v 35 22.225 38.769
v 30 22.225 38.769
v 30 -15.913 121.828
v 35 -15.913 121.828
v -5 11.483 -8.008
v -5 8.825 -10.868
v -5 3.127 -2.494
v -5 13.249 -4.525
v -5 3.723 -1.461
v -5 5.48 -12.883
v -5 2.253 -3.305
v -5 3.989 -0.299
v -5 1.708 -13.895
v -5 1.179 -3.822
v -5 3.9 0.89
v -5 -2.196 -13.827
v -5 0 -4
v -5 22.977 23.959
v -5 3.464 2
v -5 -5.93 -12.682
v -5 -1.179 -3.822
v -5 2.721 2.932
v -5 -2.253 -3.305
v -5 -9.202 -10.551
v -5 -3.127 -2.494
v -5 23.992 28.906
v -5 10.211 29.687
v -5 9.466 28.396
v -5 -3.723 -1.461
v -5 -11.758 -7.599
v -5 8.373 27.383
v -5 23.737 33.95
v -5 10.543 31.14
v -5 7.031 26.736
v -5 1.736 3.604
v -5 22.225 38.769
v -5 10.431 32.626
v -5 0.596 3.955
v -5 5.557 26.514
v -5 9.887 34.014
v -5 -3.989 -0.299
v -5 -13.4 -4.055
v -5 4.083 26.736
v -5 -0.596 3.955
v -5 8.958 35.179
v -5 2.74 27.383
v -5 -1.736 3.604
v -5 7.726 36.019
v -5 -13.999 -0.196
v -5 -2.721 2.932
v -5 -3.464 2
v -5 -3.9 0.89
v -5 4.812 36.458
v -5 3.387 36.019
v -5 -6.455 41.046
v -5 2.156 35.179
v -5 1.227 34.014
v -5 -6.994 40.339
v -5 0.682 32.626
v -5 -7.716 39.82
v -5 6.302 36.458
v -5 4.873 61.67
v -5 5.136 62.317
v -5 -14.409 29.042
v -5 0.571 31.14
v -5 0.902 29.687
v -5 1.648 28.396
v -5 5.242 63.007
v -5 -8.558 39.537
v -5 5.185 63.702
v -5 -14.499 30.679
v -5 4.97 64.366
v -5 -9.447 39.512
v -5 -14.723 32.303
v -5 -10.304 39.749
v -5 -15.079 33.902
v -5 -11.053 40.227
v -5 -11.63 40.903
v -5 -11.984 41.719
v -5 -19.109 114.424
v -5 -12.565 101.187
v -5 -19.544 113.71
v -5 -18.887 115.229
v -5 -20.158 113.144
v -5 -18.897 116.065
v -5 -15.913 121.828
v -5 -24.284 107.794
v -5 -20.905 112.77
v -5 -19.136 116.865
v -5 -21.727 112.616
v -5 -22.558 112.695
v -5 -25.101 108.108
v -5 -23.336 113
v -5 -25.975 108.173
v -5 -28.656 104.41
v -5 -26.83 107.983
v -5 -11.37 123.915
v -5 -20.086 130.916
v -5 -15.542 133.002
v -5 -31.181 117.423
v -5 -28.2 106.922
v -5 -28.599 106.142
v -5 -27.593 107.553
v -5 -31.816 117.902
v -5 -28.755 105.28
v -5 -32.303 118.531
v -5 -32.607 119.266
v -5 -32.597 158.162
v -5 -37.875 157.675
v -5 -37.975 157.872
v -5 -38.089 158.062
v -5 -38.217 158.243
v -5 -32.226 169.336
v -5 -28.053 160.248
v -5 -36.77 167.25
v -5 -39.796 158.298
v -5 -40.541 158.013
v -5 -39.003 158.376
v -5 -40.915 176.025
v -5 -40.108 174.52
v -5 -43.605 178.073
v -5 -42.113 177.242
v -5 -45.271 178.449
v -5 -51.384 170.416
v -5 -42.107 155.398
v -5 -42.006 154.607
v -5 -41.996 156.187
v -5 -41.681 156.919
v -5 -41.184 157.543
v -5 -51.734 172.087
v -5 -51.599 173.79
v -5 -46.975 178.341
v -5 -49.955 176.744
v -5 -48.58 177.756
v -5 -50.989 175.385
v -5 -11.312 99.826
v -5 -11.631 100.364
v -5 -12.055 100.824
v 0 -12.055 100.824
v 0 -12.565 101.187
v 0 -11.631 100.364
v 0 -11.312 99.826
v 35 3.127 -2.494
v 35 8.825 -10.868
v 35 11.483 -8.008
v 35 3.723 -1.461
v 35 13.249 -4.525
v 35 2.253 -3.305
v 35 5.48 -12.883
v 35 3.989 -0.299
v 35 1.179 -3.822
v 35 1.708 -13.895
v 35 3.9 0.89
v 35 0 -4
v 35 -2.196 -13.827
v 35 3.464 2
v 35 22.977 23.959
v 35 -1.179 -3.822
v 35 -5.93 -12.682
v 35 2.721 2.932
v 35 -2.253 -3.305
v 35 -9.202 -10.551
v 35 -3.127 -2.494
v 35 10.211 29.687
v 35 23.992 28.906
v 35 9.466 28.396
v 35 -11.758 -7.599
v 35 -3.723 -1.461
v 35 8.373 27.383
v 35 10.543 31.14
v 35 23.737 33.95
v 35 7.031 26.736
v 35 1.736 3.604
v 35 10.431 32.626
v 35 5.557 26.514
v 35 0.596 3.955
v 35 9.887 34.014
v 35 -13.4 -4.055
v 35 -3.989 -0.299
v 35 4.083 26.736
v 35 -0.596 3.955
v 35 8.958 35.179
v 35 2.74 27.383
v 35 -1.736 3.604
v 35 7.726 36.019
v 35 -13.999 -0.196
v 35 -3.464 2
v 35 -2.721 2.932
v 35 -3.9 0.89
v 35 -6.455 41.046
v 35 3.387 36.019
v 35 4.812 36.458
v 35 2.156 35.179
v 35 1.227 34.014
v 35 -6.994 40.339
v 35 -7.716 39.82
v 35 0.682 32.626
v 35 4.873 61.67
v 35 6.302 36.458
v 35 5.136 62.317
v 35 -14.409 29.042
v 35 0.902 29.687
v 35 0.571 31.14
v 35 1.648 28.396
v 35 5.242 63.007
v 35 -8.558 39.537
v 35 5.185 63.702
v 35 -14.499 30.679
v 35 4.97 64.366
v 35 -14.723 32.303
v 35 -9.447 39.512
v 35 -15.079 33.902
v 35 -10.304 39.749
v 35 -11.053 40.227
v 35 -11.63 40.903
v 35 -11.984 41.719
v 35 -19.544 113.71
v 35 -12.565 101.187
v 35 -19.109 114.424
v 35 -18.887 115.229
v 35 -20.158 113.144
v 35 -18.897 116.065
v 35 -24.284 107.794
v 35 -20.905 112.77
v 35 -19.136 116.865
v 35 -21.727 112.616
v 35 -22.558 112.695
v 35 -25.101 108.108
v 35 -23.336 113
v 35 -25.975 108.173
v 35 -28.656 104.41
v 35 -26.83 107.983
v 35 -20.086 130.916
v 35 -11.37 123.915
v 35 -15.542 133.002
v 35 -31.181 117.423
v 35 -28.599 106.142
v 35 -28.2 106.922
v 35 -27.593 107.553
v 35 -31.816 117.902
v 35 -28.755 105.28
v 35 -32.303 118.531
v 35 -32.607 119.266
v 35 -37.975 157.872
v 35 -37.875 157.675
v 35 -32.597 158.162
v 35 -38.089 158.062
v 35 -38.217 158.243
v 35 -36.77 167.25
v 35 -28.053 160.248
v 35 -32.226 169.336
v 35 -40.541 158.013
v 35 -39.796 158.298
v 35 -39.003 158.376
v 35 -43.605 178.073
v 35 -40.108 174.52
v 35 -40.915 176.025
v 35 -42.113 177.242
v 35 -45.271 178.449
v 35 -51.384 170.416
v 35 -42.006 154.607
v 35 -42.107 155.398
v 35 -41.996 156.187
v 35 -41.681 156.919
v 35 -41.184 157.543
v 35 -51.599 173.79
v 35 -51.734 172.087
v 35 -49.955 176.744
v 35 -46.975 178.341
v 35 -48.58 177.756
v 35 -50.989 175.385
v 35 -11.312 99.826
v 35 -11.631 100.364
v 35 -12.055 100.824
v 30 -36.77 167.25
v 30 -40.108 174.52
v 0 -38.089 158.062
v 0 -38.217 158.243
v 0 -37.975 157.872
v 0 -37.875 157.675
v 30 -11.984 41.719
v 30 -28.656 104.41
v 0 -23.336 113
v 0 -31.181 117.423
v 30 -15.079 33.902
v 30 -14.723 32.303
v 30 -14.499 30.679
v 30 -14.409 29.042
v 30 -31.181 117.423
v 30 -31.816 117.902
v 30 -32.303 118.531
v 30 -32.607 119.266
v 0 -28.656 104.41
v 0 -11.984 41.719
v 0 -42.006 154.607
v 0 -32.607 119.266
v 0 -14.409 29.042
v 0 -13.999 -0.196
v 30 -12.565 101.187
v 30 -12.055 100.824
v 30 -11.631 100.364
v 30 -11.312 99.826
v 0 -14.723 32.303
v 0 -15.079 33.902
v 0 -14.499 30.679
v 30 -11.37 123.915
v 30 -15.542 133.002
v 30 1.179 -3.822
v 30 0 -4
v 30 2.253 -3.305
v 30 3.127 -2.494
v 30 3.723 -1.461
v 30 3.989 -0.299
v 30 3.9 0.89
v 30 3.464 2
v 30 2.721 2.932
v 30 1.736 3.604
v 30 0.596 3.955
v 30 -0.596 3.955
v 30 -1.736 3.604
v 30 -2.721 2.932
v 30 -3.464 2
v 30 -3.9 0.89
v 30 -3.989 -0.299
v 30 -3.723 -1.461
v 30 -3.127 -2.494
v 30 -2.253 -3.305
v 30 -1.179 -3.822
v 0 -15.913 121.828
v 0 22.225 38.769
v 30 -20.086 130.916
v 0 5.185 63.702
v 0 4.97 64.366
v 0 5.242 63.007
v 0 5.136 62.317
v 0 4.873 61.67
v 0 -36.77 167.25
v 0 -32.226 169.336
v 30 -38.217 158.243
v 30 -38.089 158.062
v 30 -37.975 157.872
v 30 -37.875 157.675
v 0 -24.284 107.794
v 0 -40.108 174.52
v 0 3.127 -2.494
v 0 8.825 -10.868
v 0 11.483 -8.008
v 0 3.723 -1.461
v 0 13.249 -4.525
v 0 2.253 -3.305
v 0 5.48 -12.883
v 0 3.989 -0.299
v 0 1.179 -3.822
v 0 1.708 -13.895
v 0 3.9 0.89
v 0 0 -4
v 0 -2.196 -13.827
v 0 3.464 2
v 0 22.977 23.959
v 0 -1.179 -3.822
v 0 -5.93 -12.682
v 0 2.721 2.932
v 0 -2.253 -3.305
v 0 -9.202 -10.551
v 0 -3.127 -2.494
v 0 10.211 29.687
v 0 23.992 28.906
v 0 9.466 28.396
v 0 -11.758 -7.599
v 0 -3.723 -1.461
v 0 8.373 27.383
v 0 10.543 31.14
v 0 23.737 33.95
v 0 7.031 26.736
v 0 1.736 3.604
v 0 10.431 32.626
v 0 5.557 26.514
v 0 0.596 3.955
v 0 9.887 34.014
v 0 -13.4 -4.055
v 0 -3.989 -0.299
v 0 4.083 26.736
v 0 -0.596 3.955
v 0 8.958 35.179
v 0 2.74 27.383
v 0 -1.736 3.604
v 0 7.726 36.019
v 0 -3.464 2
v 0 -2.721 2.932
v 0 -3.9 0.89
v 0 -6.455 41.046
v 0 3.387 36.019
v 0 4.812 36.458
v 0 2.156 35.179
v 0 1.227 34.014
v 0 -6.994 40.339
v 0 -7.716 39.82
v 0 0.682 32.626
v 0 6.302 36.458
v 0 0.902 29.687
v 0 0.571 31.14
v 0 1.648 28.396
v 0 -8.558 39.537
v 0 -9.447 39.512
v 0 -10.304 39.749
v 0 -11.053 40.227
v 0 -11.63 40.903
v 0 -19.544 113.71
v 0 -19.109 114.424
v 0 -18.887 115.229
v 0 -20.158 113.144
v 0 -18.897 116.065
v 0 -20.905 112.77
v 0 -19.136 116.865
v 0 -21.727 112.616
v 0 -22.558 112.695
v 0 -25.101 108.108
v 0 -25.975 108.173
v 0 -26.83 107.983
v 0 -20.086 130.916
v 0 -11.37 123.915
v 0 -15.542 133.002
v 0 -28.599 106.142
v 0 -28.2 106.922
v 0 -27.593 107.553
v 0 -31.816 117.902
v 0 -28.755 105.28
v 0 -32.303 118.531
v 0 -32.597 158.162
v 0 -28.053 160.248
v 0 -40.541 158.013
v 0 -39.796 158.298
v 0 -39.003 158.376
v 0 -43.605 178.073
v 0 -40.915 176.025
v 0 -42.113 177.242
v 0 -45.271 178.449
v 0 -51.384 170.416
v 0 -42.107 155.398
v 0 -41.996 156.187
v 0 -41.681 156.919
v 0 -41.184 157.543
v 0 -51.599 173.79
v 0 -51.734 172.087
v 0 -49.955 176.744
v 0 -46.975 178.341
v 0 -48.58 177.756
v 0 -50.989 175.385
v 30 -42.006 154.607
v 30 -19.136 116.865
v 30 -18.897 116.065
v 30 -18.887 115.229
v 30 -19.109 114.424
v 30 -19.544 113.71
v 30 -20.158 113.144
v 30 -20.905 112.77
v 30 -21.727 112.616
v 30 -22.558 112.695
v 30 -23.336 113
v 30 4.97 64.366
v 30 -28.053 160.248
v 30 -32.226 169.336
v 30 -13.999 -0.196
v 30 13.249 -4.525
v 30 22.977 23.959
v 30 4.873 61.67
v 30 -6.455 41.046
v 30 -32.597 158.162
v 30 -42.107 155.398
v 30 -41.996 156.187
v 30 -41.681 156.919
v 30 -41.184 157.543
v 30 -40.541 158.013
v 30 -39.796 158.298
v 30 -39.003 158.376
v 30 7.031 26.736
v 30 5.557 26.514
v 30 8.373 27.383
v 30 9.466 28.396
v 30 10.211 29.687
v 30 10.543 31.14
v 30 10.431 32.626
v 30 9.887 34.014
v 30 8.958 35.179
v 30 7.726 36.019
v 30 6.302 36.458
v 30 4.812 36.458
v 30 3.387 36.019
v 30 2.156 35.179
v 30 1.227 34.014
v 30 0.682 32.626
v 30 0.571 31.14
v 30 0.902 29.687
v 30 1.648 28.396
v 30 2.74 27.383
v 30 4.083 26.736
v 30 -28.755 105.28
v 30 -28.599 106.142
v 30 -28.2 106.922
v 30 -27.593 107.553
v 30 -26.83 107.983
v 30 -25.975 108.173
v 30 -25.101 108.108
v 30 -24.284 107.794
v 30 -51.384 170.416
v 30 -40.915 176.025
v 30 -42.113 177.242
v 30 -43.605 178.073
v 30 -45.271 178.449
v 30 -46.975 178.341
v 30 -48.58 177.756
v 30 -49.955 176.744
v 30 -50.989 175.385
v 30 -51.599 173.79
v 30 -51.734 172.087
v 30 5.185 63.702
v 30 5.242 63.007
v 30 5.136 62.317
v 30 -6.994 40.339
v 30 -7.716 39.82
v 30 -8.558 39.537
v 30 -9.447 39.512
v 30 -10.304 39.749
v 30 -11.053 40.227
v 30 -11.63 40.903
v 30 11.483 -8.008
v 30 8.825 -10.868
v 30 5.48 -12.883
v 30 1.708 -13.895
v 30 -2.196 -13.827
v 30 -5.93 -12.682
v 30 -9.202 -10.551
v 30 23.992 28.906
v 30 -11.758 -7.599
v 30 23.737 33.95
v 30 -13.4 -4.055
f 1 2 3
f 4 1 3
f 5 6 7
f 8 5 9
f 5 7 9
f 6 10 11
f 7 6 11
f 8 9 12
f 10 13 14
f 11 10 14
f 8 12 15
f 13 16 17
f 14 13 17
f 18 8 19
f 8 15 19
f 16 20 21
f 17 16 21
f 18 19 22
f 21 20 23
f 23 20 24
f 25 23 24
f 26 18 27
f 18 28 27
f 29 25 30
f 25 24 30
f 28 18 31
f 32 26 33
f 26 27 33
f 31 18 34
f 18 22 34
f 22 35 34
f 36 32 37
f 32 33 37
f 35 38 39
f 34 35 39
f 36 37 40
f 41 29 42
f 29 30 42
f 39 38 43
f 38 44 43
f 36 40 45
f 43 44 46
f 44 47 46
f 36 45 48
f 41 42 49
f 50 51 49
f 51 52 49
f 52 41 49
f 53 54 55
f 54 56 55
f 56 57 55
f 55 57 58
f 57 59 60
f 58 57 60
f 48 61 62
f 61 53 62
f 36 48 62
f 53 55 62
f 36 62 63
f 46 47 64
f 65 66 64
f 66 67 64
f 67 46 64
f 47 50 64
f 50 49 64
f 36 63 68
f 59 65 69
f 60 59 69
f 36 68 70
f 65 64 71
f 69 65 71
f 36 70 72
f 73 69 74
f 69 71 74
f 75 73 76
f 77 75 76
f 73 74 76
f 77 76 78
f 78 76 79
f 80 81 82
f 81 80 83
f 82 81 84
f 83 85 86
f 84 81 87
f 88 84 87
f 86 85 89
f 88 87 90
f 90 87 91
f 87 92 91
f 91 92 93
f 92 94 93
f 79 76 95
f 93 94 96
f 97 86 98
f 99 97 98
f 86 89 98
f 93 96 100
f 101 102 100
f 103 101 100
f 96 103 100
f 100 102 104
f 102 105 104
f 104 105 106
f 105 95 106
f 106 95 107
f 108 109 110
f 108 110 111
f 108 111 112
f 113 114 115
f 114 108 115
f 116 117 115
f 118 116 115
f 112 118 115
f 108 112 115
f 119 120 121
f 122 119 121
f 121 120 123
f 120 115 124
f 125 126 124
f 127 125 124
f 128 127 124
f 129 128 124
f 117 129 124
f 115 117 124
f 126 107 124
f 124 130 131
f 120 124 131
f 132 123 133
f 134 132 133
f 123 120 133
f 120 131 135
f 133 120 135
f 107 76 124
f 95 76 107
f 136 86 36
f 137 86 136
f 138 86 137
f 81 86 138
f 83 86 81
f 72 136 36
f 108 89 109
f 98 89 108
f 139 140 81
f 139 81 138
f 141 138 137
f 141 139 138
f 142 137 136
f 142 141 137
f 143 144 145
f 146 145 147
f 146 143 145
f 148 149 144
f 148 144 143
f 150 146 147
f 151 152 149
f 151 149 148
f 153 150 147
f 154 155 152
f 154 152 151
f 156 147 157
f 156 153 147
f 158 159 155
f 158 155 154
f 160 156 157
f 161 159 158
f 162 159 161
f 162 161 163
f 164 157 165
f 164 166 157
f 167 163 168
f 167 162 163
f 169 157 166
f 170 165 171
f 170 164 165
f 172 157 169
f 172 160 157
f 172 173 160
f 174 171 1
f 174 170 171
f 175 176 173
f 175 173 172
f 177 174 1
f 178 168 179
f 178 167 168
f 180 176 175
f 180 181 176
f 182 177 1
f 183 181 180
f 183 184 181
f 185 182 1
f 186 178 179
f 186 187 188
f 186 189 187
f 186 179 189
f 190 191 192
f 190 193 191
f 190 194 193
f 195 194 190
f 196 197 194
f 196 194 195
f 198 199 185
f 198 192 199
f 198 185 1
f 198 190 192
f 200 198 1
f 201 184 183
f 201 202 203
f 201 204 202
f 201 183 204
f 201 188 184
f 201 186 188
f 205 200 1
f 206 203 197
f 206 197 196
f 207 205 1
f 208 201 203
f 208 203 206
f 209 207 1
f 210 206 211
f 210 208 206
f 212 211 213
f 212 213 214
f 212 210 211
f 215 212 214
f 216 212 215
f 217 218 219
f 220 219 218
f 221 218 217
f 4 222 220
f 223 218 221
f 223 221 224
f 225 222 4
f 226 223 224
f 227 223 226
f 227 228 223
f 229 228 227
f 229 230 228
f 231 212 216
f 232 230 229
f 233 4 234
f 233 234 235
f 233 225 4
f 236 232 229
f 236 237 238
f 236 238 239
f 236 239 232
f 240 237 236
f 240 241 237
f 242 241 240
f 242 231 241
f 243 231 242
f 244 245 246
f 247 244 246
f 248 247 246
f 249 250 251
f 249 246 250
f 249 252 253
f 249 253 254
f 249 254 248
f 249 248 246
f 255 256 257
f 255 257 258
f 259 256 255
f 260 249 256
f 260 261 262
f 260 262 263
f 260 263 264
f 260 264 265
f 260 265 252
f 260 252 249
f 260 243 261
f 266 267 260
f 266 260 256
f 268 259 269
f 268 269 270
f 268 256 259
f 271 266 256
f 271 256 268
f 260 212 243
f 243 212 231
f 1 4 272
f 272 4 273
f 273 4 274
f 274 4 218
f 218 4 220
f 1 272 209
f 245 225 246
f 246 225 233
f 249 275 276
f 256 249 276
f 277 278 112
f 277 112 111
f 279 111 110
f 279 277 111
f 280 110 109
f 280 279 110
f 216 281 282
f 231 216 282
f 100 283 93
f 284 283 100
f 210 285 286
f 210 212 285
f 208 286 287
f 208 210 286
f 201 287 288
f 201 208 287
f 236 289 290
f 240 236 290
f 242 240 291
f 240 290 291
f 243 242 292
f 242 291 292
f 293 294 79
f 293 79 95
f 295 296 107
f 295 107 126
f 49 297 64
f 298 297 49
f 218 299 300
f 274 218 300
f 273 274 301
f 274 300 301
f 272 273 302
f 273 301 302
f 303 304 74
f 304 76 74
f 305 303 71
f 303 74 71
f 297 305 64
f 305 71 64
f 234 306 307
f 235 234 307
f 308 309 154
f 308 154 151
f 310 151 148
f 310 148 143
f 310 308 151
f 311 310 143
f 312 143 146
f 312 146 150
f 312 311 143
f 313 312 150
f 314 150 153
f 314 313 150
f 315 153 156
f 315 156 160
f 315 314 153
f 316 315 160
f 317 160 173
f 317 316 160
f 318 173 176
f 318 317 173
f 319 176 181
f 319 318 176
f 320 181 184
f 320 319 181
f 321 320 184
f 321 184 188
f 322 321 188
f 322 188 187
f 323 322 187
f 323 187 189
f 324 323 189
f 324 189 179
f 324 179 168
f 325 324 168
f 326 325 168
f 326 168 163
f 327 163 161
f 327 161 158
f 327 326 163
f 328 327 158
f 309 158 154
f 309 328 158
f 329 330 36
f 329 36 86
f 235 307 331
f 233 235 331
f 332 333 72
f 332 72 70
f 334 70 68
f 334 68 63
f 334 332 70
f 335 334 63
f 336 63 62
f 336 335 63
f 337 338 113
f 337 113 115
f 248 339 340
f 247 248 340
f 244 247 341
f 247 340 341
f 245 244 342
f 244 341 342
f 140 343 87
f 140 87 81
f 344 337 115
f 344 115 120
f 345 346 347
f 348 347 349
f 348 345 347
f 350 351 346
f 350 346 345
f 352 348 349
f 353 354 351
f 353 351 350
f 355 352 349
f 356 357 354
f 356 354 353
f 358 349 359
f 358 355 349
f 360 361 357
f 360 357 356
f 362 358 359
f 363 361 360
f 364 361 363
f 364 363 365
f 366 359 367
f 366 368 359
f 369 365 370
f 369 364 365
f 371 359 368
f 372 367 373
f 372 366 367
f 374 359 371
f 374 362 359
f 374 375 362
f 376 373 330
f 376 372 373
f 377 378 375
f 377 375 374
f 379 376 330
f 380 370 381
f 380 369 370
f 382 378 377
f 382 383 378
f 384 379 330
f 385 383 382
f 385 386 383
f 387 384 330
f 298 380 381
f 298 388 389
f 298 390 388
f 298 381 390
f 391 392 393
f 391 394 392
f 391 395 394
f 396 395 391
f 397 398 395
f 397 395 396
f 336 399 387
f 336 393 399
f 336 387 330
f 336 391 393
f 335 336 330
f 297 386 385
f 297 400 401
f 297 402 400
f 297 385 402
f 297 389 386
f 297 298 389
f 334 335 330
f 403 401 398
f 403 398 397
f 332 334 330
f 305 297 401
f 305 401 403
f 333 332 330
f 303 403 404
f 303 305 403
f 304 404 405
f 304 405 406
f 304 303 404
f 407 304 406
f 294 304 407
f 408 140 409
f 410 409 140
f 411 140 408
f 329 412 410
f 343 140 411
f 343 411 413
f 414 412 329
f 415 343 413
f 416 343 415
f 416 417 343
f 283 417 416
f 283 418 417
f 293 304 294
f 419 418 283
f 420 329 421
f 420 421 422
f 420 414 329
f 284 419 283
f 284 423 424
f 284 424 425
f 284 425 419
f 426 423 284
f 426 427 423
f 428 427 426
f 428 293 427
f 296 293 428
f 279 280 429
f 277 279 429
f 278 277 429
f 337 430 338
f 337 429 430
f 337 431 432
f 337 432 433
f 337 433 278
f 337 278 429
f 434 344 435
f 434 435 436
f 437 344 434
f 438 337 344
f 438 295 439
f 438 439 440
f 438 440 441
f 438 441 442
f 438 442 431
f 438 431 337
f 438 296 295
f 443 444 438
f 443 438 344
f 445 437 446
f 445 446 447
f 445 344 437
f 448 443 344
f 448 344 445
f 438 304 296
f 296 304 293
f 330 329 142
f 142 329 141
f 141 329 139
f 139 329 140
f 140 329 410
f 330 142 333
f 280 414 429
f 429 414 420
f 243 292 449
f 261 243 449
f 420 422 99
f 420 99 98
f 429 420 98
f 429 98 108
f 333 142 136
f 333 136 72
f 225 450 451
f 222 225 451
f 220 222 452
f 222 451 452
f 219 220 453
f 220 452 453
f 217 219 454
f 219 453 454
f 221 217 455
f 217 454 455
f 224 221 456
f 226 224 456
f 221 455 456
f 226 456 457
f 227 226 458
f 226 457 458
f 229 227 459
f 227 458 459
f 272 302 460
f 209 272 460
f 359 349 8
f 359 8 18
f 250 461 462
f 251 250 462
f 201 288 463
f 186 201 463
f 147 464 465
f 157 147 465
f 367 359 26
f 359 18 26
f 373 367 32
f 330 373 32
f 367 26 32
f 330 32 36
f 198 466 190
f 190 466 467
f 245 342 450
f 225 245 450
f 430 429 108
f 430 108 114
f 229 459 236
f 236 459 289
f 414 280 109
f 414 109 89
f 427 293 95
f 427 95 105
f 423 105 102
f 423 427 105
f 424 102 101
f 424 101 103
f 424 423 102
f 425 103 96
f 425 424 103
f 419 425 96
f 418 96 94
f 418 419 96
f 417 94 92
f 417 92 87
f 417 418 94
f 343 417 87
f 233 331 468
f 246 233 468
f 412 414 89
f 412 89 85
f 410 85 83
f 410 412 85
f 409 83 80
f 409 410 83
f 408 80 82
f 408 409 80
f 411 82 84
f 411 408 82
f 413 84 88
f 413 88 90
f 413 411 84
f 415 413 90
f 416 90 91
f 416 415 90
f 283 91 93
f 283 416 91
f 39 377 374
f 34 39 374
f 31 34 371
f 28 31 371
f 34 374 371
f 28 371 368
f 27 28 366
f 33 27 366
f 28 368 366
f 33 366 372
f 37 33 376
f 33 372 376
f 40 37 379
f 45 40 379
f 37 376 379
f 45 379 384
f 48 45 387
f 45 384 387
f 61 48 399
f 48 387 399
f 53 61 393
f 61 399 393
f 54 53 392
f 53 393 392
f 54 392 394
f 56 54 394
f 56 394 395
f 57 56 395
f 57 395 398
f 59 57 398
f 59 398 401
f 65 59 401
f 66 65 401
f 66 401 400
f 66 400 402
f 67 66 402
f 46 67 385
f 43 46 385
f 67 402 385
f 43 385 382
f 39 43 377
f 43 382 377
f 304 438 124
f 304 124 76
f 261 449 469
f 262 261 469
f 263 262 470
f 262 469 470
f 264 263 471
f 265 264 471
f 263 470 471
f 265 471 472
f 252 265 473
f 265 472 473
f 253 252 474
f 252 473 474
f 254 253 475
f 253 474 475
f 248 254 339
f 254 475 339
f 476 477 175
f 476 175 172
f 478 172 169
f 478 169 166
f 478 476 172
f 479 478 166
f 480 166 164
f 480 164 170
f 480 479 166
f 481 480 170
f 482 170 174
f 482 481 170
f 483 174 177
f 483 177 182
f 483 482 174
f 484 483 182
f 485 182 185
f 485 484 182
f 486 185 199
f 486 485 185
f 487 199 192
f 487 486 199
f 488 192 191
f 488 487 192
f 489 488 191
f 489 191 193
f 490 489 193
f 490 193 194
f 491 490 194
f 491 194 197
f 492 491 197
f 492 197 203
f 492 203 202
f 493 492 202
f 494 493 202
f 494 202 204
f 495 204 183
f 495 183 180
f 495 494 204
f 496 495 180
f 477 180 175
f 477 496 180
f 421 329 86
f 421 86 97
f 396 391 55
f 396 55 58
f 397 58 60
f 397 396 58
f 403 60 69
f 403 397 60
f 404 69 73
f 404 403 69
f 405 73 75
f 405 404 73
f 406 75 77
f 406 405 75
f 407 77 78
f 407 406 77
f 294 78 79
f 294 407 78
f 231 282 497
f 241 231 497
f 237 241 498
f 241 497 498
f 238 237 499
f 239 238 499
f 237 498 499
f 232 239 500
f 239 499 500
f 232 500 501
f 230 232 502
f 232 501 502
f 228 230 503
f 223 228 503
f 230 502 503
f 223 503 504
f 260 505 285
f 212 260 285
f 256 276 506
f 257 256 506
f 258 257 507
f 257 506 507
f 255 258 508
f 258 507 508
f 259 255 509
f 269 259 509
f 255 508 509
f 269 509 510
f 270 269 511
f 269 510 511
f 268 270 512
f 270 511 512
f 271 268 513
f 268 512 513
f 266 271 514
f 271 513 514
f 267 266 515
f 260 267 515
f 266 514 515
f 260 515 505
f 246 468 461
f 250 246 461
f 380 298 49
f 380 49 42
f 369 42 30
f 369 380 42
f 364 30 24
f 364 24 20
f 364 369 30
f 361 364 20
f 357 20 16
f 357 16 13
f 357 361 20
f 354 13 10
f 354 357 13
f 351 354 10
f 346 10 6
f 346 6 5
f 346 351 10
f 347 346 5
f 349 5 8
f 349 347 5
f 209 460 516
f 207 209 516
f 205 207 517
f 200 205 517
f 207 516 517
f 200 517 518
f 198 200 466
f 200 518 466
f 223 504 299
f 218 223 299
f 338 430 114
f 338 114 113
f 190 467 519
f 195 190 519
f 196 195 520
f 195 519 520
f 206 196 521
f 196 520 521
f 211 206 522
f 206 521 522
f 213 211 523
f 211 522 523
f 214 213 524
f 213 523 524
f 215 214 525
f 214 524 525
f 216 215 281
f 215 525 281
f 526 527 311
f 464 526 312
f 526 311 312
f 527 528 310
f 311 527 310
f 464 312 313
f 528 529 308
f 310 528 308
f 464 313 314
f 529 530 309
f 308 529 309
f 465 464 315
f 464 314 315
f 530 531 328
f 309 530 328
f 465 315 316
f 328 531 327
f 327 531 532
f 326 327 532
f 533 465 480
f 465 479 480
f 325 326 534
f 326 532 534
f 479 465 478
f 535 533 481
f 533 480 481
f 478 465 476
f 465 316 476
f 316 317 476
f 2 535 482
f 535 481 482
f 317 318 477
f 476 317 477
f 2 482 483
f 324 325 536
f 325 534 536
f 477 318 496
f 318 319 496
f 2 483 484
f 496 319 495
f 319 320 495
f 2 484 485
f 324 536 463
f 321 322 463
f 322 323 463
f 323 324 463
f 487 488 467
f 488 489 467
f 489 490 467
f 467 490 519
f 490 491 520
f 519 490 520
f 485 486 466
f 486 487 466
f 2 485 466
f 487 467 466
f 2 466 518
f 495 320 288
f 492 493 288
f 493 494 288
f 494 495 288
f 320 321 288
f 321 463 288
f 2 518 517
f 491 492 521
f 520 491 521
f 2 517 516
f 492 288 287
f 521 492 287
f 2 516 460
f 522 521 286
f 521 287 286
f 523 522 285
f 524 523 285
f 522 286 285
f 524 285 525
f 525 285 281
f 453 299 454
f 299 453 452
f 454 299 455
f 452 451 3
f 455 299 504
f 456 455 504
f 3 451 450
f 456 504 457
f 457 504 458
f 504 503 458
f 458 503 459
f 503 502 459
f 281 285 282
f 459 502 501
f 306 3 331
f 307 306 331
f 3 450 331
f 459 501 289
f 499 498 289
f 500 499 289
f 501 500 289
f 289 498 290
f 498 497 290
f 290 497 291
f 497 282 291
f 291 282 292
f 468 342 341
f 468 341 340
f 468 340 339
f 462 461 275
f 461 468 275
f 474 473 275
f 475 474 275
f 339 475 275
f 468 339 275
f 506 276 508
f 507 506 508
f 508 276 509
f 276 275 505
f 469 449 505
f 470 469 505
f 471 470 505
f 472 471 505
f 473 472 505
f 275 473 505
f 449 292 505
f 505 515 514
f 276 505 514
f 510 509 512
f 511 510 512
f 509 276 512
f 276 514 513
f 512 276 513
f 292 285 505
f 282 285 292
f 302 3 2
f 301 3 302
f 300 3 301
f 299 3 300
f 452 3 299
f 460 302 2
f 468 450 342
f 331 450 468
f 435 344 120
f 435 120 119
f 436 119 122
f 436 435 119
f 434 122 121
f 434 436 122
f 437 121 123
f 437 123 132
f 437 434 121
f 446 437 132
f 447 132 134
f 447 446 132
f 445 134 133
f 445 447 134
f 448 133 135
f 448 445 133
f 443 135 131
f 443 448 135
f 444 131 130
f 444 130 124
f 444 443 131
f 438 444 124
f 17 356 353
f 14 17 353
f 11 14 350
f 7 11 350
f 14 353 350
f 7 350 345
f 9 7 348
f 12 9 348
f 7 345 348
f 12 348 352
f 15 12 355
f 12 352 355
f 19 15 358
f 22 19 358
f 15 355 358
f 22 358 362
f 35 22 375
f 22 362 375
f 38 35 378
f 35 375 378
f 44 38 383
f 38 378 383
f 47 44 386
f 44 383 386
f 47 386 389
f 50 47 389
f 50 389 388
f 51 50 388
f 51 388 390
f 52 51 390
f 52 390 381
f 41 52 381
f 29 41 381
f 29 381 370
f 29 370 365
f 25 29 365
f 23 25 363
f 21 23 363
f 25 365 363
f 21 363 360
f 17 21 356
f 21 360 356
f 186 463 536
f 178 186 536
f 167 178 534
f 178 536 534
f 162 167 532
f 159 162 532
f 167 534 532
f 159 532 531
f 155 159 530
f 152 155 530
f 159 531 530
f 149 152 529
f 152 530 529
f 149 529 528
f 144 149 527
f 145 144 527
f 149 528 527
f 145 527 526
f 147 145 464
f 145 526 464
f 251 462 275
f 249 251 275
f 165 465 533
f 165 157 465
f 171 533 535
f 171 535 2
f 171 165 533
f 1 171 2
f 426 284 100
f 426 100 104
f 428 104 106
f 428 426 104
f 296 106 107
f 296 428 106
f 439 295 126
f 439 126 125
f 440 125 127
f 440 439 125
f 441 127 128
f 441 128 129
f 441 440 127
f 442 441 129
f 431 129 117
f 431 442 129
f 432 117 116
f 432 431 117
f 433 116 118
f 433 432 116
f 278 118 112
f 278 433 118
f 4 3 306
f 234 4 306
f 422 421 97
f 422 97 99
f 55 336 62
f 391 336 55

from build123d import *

# Parameters (mm, degrees)
SKETCH1_R           = 4
SKETCH1_R_2         = 5
BOSS_EXTRUDE1_DEPTH = 5
FILLET3_R           = 20
FILLET6_R           = 3


with BuildPart() as part:
    # Sketch1 → Boss-Extrude1 (new body)
    # profile 1 of 3: a face of its own
    with BuildSketch(Plane.YZ):
        with BuildLine():
            Line((-14.443258315, 31.513848096), (-13.998623919, -0.196286448))
            ThreePointArc((-13.998623919, -0.196286448), (-2.196477435, -13.826622396), (13.248647006, -4.52474889))
            Line((13.248647006, -4.52474889), (25.556741685, 31.513848096))
            Line((25.556741685, 31.513848096), (-15.913444308, 121.828294459))
            Line((-15.913444308, 121.828294459), (-17.991906384, 126.354803013))
            Line((-17.991906384, 126.354803013), (-20.086315573, 130.916041451))
            Line((-20.086315573, 130.916041451), (-32.596955812, 158.161917487))
            Line((-32.596955812, 158.161917487), (-34.683391444, 162.705790984))
            Line((-34.683391444, 162.705790984), (-36.769827077, 167.24966448))
            Line((-36.769827077, 167.24966448), (-40.108124089, 174.519862074))
            ThreePointArc((-40.108124089, 174.519862074), (-47.798400673, 178.105896939), (-51.384435538, 170.415620354))
            Line((-51.384435538, 170.415620354), (-14.443258315, 31.513848096))
        make_face()
        with Locations(Location((0, 0, 0), (0, 0, 270))):
            Circle(SKETCH1_R, mode=Mode.SUBTRACT)
        with Locations(Location((5.556741685, 31.513848096, 0), (0, 0, 270))):
            Circle(SKETCH1_R_2, mode=Mode.SUBTRACT)
        Polygon((-10.059219018, 34.483430451), (-30.486505123, 111.291655193), (-11.718080145, 100.709404741), (5.599975549, 62.99386104), align=None, mode=Mode.SUBTRACT)
        Polygon((-38.215011053, 158.414852351), (-15.274502195, 108.454638594), (-32.282363467, 118.044225778), (-44.116299331, 162.540768328), align=None, mode=Mode.SUBTRACT)
    # profile 2 of 3: a face of its own
    with BuildSketch(Plane.YZ):
        Polygon((-17.991906384, 126.354803013), (-15.913444308, 121.828294459), (-11.369603993, 123.914714855), (-15.542475258, 133.002461848), (-20.086315573, 130.916041451), align=None)
    # profile 3 of 3: a face of its own
    with BuildSketch(Plane.YZ):
        Polygon((-32.22595358, 169.336100113), (-36.769827077, 167.24966448), (-34.683391444, 162.705790984), (-32.596955812, 158.161917487), (-28.053082315, 160.24835312), align=None)
    extrude(amount=-BOSS_EXTRUDE1_DEPTH)

    # Fillet3
    fillet3_edges = [part.edges().sort_by_distance(p)[0] for p in [
        (-2.5, 25.556741685, 31.513848096),
        (-2.5, -14.443258315, 31.513848096),
    ]]
    fillet(fillet3_edges, radius=FILLET3_R)

    # Fillet6
    # the kernel refuses this fillet: 3 mm, written as the material it adds along each edge
    with BuildSketch(Plane(origin=(0, -38.215011053, 158.414852351), x_dir=(0, 0.41728712651347166, -0.9087746992770703), z_dir=(-1, 0, 0))) as fillet6_piece_1:
        with BuildLine():
            CenterArc((FILLET6_R * 0.271478941521, FILLET6_R), FILLET6_R, 239.62294962, 30.37705038)
            Line((-FILLET6_R * 0.23420930525, FILLET6_R * 0.137283709973), (0, 0))
            Line((0, 0), (FILLET6_R * 0.271478941521, 0))
        make_face()
    extrude(amount=5)
    with BuildSketch(Plane(origin=(0, -32.282363467, 118.044225778), x_dir=(0, 0.8710790696902164, -0.49114280443433855), z_dir=(-1, 0, 0))) as fillet6_piece_2:
        with BuildLine():
            CenterArc((FILLET6_R * 0.421297147858, -FILLET6_R), FILLET6_R, 90, 45.691106369)
            Line((-FILLET6_R * 0.294287167004, -FILLET6_R * 0.301473630904), (0, 0))
            Line((0, 0), (FILLET6_R * 0.421297147858, 0))
        make_face()
    extrude(amount=5)
    with BuildSketch(Plane(origin=(0, -30.486505123, 111.291655193), x_dir=(0, 0.25701761253564515, -0.9664067191645953), z_dir=(-1, 0, 0))) as fillet6_piece_3:
        with BuildLine():
            CenterArc((FILLET6_R * 2.37362157585, -FILLET6_R), FILLET6_R, 90, 134.308893631)
            Line((FILLET6_R * 1.65803726099, -FILLET6_R * 1.6985263691), (0, 0))
            Line((0, 0), (FILLET6_R * 2.37362157585, 0))
        make_face()
    extrude(amount=5)
    with BuildSketch(Plane(origin=(0, -11.718080145, 100.709404741), x_dir=(0, -0.8710790696902125, 0.4911428044343457), z_dir=(-1, 0, 0))) as fillet6_piece_4:
        with BuildLine():
            CenterArc((FILLET6_R * 0.324156203472, -FILLET6_R), FILLET6_R, 90, 35.920846961)
            Line((-FILLET6_R * 0.262510846562, -FILLET6_R * 0.190171763641), (0, 0))
            Line((0, 0), (FILLET6_R * 0.324156203472, 0))
        make_face()
    extrude(amount=5)
    with BuildSketch(Plane(origin=(0, -10.059219018, 34.483430451), x_dir=(0, -0.2570176125356449, 0.9664067191645953), z_dir=(-1, 0, 0))) as fillet6_piece_5:
        with BuildLine():
            CenterArc((FILLET6_R * 2.49571060233, FILLET6_R), FILLET6_R, 133.670716463, 136.329283537)
            Line((FILLET6_R * 1.80519778573, FILLET6_R * 1.72332015741), (0, 0))
            Line((0, 0), (FILLET6_R * 2.49571060233, 0))
        make_face()
    extrude(amount=5)
    with BuildSketch(Plane(origin=(0, 5.599975549, 62.99386104), x_dir=(0, -0.41728712651347205, 0.9087746992770702), z_dir=(-1, 0, 0))) as fillet6_piece_6:
        with BuildLine():
            CenterArc((FILLET6_R * 0.503395718442, -FILLET6_R), FILLET6_R, 90, 53.440975871)
            Line((-FILLET6_R * 0.299847949894, -FILLET6_R * 0.404349423506), (0, 0))
            Line((0, 0), (FILLET6_R * 0.503395718442, 0))
        make_face()
    extrude(amount=5)
    with BuildSketch(Plane(origin=(0, -15.274502195, 108.454638594), x_dir=(0, -0.4172871265134709, 0.9087746992770708), z_dir=(-1, 0, 0))) as fillet6_piece_7:
        with BuildLine():
            CenterArc((FILLET6_R * 3.08493247789, -FILLET6_R), FILLET6_R, 90, 144.079153039)
            Line((FILLET6_R * 2.49826542786, -FILLET6_R * 1.80982823636), (0, 0))
            Line((0, 0), (FILLET6_R * 3.08493247789, 0))
        make_face()
    extrude(amount=5)
    with BuildSketch(Plane(origin=(0, -44.116299331, 162.540768328), x_dir=(0, 0.2570176125356455, -0.9664067191645951), z_dir=(-1, 0, 0))) as fillet6_piece_8:
        with BuildLine():
            CenterArc((FILLET6_R * 2.73652664972, -FILLET6_R), FILLET6_R, 90, 139.852690212)
            Line((FILLET6_R * 2.09177163516, -FILLET6_R * 1.76438927988), (0, 0))
            Line((0, 0), (FILLET6_R * 2.73652664972, 0))
        make_face()
    extrude(amount=5)


with BuildPart() as body_2:
    # Mirror4: mirrored copy
    add(part.part.mirror(Plane(origin=(15, 0, 0), x_dir=(0, 0, 1), z_dir=(1, 0, 0))))


solid = Compound([part.part, body_2.part])
